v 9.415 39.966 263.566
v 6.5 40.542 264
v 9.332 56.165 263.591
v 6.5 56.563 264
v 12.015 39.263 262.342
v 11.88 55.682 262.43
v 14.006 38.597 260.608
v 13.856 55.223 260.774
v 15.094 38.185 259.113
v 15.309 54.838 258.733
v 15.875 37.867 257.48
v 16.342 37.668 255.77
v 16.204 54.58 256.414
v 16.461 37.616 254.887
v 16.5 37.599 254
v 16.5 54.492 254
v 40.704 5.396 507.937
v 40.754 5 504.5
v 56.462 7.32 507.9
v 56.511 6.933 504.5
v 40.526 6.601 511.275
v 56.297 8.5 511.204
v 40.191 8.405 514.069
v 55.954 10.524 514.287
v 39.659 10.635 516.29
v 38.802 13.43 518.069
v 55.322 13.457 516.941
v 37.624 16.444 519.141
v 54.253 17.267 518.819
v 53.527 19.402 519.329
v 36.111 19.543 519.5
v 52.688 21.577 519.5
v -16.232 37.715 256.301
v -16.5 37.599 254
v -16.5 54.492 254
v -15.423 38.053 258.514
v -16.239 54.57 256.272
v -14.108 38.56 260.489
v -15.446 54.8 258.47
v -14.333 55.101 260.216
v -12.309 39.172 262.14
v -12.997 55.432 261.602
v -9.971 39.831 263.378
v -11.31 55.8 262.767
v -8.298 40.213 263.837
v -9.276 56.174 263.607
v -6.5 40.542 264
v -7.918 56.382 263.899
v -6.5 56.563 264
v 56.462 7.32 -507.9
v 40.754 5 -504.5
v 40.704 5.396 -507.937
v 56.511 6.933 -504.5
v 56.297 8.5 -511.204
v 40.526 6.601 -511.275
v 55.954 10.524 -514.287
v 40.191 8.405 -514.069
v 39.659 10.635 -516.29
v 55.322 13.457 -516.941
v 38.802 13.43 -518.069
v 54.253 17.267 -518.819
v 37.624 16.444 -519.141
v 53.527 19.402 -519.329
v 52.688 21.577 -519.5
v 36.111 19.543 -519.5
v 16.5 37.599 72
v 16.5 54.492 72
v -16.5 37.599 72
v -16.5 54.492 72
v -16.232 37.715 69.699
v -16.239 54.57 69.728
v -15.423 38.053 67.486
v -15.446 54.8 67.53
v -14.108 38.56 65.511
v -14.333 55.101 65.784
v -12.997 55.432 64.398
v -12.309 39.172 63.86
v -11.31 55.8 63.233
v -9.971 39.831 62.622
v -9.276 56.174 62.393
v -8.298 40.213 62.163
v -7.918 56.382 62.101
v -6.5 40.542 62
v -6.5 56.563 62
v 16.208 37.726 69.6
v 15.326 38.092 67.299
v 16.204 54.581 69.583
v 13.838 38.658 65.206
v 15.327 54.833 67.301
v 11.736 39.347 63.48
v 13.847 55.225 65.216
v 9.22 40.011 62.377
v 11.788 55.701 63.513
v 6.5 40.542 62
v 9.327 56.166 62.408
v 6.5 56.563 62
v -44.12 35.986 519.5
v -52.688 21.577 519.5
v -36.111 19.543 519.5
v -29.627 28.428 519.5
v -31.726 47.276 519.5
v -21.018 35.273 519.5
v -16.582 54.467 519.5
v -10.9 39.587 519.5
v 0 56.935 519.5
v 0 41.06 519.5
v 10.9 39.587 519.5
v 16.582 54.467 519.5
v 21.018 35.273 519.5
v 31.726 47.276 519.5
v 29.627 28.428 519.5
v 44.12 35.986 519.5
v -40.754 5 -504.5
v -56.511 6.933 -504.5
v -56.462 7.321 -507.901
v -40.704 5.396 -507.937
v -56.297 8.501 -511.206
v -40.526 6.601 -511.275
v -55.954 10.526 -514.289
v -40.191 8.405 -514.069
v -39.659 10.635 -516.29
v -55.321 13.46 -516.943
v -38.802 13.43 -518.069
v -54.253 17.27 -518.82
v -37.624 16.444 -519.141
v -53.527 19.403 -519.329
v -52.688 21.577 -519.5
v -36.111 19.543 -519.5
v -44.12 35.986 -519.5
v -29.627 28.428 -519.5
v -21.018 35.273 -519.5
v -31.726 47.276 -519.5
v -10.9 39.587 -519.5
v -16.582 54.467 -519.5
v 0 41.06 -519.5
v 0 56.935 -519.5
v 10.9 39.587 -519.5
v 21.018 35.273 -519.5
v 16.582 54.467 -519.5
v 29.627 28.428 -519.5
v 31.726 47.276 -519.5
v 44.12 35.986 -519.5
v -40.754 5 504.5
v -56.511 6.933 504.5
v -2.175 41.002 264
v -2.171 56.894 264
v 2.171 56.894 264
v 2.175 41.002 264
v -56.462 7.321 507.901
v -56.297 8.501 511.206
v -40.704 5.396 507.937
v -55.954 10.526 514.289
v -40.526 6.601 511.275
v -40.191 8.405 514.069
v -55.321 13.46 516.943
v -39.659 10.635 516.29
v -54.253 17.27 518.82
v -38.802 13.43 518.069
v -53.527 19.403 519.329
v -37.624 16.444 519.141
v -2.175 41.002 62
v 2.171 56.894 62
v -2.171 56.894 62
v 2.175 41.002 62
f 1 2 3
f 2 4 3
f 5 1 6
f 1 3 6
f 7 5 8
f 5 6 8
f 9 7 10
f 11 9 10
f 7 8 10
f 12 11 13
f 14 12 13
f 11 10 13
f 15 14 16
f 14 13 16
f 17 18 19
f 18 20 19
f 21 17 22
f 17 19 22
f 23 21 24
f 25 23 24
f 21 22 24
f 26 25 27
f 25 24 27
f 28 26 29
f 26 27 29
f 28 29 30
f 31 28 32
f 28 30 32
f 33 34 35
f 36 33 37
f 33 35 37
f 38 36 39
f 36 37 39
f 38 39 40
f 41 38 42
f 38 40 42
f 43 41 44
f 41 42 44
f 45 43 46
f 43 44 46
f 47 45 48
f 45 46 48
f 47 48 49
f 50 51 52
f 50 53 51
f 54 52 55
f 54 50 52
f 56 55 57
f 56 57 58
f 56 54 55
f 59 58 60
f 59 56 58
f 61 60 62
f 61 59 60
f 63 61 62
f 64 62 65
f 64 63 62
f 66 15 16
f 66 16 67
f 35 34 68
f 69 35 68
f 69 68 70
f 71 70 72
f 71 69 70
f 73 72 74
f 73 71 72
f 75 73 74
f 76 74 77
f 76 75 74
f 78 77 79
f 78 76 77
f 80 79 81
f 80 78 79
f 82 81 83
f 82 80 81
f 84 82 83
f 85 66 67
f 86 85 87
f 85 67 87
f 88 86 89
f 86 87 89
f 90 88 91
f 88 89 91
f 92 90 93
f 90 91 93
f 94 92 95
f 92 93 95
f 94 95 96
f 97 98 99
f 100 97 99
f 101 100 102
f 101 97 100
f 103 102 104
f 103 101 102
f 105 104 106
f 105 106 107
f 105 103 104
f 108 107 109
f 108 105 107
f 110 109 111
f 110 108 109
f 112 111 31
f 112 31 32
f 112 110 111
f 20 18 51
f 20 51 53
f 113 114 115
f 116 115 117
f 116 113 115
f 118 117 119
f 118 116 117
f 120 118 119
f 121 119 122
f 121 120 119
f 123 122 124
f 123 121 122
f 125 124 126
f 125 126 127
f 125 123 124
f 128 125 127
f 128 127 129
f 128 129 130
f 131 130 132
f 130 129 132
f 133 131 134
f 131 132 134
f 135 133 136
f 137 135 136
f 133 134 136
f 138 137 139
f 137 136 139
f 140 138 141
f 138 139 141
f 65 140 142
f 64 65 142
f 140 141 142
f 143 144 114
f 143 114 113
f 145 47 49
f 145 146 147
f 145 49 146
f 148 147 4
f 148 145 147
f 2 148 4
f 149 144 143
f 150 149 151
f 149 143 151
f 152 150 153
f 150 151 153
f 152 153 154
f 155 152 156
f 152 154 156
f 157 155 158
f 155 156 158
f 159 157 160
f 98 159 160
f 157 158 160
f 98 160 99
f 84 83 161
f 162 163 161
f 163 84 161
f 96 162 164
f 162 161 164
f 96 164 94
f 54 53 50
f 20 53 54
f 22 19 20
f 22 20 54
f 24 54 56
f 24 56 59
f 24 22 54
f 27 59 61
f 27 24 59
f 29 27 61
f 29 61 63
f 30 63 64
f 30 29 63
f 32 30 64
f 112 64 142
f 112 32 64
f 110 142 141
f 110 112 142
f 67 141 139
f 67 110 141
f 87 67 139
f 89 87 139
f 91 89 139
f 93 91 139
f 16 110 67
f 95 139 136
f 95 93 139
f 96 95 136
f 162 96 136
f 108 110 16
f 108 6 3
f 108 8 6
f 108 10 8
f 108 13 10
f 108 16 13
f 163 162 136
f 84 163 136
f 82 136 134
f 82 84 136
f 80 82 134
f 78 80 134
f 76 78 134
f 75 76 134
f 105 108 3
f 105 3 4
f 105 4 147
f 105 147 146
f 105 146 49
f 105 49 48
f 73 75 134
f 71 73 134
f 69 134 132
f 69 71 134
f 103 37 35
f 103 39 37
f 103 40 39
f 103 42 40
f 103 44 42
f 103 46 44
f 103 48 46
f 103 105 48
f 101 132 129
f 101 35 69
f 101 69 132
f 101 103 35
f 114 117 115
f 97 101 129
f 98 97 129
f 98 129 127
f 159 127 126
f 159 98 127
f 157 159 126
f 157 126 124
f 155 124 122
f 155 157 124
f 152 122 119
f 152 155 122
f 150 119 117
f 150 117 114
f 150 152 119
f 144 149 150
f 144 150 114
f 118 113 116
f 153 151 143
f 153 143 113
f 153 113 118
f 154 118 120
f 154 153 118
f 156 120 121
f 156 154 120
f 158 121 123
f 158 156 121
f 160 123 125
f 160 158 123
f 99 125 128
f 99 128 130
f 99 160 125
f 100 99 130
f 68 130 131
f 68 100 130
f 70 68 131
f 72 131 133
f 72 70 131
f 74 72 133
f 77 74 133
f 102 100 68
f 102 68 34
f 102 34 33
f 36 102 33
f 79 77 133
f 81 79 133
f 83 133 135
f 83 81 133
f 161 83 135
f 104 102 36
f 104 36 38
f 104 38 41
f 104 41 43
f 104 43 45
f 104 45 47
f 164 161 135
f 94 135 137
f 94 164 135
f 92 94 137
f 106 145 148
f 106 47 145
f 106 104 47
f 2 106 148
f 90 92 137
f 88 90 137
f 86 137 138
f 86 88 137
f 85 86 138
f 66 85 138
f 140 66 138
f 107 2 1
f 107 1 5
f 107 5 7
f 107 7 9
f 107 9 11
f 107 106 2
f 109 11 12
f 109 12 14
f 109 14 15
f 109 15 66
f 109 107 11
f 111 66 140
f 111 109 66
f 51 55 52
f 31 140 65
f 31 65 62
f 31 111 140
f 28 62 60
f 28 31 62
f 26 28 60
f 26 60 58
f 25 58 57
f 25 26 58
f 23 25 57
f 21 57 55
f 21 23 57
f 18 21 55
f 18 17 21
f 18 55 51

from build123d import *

# Parameters (mm, degrees)
BOSS_EXTRUDE1_DEPTH = 519.5
FILLET1_R           = 15
SKETCH2_W           = 33
SKETCH2_H           = 202
CUT_EXTRUDE1_DEPTH  = 57.9350001
FILLET2_R           = 10


with BuildPart() as part:
    # Sketch1 → Boss-Extrude1 (new body, symmetric)
    with BuildSketch(Plane.XY):
        with BuildLine():
            Line((40.754430434, 5), (56.51128828, 6.933146615))
            ThreePointArc((56.51128828, 6.933146615), (0, 56.935), (-56.51128828, 6.933146615))
            Line((-56.51128828, 6.933146615), (-40.754430434, 5))
            ThreePointArc((-40.754430434, 5), (0, 41.06), (40.754430434, 5))
        make_face()
    extrude(amount=BOSS_EXTRUDE1_DEPTH, both=True)

    # Fillet1
    fillet1_edges = [part.edges().sort_by_distance(p)[0] for p in [
        (-48.632859357, 5.966573307, 519.5),
        (-48.632859357, 5.966573307, -519.5),
        (48.632859357, 5.966573307, -519.5),
        (48.632859357, 5.966573307, 519.5),
    ]]
    fillet(fillet1_edges, radius=FILLET1_R)

    # Sketch2 → Cut-Extrude1 (cut, through all)
    with BuildSketch(Plane(origin=(0, 0, 0), x_dir=(1, 0, 0), z_dir=(0, 1, 0))):
        with Locations((0, -163)):
            Rectangle(SKETCH2_W, SKETCH2_H)
    extrude(amount=CUT_EXTRUDE1_DEPTH, mode=Mode.SUBTRACT)

    # Fillet2
    fillet2_edges = [part.edges().sort_by_distance(p)[0] for p in [
        (-16.5, 46.045270275, 62),
        (-16.5, 46.045270275, 264),
        (16.5, 46.045270275, 264),
        (16.5, 46.045270275, 62),
    ]]
    fillet(fillet2_edges, radius=FILLET2_R)


solid = part.part
